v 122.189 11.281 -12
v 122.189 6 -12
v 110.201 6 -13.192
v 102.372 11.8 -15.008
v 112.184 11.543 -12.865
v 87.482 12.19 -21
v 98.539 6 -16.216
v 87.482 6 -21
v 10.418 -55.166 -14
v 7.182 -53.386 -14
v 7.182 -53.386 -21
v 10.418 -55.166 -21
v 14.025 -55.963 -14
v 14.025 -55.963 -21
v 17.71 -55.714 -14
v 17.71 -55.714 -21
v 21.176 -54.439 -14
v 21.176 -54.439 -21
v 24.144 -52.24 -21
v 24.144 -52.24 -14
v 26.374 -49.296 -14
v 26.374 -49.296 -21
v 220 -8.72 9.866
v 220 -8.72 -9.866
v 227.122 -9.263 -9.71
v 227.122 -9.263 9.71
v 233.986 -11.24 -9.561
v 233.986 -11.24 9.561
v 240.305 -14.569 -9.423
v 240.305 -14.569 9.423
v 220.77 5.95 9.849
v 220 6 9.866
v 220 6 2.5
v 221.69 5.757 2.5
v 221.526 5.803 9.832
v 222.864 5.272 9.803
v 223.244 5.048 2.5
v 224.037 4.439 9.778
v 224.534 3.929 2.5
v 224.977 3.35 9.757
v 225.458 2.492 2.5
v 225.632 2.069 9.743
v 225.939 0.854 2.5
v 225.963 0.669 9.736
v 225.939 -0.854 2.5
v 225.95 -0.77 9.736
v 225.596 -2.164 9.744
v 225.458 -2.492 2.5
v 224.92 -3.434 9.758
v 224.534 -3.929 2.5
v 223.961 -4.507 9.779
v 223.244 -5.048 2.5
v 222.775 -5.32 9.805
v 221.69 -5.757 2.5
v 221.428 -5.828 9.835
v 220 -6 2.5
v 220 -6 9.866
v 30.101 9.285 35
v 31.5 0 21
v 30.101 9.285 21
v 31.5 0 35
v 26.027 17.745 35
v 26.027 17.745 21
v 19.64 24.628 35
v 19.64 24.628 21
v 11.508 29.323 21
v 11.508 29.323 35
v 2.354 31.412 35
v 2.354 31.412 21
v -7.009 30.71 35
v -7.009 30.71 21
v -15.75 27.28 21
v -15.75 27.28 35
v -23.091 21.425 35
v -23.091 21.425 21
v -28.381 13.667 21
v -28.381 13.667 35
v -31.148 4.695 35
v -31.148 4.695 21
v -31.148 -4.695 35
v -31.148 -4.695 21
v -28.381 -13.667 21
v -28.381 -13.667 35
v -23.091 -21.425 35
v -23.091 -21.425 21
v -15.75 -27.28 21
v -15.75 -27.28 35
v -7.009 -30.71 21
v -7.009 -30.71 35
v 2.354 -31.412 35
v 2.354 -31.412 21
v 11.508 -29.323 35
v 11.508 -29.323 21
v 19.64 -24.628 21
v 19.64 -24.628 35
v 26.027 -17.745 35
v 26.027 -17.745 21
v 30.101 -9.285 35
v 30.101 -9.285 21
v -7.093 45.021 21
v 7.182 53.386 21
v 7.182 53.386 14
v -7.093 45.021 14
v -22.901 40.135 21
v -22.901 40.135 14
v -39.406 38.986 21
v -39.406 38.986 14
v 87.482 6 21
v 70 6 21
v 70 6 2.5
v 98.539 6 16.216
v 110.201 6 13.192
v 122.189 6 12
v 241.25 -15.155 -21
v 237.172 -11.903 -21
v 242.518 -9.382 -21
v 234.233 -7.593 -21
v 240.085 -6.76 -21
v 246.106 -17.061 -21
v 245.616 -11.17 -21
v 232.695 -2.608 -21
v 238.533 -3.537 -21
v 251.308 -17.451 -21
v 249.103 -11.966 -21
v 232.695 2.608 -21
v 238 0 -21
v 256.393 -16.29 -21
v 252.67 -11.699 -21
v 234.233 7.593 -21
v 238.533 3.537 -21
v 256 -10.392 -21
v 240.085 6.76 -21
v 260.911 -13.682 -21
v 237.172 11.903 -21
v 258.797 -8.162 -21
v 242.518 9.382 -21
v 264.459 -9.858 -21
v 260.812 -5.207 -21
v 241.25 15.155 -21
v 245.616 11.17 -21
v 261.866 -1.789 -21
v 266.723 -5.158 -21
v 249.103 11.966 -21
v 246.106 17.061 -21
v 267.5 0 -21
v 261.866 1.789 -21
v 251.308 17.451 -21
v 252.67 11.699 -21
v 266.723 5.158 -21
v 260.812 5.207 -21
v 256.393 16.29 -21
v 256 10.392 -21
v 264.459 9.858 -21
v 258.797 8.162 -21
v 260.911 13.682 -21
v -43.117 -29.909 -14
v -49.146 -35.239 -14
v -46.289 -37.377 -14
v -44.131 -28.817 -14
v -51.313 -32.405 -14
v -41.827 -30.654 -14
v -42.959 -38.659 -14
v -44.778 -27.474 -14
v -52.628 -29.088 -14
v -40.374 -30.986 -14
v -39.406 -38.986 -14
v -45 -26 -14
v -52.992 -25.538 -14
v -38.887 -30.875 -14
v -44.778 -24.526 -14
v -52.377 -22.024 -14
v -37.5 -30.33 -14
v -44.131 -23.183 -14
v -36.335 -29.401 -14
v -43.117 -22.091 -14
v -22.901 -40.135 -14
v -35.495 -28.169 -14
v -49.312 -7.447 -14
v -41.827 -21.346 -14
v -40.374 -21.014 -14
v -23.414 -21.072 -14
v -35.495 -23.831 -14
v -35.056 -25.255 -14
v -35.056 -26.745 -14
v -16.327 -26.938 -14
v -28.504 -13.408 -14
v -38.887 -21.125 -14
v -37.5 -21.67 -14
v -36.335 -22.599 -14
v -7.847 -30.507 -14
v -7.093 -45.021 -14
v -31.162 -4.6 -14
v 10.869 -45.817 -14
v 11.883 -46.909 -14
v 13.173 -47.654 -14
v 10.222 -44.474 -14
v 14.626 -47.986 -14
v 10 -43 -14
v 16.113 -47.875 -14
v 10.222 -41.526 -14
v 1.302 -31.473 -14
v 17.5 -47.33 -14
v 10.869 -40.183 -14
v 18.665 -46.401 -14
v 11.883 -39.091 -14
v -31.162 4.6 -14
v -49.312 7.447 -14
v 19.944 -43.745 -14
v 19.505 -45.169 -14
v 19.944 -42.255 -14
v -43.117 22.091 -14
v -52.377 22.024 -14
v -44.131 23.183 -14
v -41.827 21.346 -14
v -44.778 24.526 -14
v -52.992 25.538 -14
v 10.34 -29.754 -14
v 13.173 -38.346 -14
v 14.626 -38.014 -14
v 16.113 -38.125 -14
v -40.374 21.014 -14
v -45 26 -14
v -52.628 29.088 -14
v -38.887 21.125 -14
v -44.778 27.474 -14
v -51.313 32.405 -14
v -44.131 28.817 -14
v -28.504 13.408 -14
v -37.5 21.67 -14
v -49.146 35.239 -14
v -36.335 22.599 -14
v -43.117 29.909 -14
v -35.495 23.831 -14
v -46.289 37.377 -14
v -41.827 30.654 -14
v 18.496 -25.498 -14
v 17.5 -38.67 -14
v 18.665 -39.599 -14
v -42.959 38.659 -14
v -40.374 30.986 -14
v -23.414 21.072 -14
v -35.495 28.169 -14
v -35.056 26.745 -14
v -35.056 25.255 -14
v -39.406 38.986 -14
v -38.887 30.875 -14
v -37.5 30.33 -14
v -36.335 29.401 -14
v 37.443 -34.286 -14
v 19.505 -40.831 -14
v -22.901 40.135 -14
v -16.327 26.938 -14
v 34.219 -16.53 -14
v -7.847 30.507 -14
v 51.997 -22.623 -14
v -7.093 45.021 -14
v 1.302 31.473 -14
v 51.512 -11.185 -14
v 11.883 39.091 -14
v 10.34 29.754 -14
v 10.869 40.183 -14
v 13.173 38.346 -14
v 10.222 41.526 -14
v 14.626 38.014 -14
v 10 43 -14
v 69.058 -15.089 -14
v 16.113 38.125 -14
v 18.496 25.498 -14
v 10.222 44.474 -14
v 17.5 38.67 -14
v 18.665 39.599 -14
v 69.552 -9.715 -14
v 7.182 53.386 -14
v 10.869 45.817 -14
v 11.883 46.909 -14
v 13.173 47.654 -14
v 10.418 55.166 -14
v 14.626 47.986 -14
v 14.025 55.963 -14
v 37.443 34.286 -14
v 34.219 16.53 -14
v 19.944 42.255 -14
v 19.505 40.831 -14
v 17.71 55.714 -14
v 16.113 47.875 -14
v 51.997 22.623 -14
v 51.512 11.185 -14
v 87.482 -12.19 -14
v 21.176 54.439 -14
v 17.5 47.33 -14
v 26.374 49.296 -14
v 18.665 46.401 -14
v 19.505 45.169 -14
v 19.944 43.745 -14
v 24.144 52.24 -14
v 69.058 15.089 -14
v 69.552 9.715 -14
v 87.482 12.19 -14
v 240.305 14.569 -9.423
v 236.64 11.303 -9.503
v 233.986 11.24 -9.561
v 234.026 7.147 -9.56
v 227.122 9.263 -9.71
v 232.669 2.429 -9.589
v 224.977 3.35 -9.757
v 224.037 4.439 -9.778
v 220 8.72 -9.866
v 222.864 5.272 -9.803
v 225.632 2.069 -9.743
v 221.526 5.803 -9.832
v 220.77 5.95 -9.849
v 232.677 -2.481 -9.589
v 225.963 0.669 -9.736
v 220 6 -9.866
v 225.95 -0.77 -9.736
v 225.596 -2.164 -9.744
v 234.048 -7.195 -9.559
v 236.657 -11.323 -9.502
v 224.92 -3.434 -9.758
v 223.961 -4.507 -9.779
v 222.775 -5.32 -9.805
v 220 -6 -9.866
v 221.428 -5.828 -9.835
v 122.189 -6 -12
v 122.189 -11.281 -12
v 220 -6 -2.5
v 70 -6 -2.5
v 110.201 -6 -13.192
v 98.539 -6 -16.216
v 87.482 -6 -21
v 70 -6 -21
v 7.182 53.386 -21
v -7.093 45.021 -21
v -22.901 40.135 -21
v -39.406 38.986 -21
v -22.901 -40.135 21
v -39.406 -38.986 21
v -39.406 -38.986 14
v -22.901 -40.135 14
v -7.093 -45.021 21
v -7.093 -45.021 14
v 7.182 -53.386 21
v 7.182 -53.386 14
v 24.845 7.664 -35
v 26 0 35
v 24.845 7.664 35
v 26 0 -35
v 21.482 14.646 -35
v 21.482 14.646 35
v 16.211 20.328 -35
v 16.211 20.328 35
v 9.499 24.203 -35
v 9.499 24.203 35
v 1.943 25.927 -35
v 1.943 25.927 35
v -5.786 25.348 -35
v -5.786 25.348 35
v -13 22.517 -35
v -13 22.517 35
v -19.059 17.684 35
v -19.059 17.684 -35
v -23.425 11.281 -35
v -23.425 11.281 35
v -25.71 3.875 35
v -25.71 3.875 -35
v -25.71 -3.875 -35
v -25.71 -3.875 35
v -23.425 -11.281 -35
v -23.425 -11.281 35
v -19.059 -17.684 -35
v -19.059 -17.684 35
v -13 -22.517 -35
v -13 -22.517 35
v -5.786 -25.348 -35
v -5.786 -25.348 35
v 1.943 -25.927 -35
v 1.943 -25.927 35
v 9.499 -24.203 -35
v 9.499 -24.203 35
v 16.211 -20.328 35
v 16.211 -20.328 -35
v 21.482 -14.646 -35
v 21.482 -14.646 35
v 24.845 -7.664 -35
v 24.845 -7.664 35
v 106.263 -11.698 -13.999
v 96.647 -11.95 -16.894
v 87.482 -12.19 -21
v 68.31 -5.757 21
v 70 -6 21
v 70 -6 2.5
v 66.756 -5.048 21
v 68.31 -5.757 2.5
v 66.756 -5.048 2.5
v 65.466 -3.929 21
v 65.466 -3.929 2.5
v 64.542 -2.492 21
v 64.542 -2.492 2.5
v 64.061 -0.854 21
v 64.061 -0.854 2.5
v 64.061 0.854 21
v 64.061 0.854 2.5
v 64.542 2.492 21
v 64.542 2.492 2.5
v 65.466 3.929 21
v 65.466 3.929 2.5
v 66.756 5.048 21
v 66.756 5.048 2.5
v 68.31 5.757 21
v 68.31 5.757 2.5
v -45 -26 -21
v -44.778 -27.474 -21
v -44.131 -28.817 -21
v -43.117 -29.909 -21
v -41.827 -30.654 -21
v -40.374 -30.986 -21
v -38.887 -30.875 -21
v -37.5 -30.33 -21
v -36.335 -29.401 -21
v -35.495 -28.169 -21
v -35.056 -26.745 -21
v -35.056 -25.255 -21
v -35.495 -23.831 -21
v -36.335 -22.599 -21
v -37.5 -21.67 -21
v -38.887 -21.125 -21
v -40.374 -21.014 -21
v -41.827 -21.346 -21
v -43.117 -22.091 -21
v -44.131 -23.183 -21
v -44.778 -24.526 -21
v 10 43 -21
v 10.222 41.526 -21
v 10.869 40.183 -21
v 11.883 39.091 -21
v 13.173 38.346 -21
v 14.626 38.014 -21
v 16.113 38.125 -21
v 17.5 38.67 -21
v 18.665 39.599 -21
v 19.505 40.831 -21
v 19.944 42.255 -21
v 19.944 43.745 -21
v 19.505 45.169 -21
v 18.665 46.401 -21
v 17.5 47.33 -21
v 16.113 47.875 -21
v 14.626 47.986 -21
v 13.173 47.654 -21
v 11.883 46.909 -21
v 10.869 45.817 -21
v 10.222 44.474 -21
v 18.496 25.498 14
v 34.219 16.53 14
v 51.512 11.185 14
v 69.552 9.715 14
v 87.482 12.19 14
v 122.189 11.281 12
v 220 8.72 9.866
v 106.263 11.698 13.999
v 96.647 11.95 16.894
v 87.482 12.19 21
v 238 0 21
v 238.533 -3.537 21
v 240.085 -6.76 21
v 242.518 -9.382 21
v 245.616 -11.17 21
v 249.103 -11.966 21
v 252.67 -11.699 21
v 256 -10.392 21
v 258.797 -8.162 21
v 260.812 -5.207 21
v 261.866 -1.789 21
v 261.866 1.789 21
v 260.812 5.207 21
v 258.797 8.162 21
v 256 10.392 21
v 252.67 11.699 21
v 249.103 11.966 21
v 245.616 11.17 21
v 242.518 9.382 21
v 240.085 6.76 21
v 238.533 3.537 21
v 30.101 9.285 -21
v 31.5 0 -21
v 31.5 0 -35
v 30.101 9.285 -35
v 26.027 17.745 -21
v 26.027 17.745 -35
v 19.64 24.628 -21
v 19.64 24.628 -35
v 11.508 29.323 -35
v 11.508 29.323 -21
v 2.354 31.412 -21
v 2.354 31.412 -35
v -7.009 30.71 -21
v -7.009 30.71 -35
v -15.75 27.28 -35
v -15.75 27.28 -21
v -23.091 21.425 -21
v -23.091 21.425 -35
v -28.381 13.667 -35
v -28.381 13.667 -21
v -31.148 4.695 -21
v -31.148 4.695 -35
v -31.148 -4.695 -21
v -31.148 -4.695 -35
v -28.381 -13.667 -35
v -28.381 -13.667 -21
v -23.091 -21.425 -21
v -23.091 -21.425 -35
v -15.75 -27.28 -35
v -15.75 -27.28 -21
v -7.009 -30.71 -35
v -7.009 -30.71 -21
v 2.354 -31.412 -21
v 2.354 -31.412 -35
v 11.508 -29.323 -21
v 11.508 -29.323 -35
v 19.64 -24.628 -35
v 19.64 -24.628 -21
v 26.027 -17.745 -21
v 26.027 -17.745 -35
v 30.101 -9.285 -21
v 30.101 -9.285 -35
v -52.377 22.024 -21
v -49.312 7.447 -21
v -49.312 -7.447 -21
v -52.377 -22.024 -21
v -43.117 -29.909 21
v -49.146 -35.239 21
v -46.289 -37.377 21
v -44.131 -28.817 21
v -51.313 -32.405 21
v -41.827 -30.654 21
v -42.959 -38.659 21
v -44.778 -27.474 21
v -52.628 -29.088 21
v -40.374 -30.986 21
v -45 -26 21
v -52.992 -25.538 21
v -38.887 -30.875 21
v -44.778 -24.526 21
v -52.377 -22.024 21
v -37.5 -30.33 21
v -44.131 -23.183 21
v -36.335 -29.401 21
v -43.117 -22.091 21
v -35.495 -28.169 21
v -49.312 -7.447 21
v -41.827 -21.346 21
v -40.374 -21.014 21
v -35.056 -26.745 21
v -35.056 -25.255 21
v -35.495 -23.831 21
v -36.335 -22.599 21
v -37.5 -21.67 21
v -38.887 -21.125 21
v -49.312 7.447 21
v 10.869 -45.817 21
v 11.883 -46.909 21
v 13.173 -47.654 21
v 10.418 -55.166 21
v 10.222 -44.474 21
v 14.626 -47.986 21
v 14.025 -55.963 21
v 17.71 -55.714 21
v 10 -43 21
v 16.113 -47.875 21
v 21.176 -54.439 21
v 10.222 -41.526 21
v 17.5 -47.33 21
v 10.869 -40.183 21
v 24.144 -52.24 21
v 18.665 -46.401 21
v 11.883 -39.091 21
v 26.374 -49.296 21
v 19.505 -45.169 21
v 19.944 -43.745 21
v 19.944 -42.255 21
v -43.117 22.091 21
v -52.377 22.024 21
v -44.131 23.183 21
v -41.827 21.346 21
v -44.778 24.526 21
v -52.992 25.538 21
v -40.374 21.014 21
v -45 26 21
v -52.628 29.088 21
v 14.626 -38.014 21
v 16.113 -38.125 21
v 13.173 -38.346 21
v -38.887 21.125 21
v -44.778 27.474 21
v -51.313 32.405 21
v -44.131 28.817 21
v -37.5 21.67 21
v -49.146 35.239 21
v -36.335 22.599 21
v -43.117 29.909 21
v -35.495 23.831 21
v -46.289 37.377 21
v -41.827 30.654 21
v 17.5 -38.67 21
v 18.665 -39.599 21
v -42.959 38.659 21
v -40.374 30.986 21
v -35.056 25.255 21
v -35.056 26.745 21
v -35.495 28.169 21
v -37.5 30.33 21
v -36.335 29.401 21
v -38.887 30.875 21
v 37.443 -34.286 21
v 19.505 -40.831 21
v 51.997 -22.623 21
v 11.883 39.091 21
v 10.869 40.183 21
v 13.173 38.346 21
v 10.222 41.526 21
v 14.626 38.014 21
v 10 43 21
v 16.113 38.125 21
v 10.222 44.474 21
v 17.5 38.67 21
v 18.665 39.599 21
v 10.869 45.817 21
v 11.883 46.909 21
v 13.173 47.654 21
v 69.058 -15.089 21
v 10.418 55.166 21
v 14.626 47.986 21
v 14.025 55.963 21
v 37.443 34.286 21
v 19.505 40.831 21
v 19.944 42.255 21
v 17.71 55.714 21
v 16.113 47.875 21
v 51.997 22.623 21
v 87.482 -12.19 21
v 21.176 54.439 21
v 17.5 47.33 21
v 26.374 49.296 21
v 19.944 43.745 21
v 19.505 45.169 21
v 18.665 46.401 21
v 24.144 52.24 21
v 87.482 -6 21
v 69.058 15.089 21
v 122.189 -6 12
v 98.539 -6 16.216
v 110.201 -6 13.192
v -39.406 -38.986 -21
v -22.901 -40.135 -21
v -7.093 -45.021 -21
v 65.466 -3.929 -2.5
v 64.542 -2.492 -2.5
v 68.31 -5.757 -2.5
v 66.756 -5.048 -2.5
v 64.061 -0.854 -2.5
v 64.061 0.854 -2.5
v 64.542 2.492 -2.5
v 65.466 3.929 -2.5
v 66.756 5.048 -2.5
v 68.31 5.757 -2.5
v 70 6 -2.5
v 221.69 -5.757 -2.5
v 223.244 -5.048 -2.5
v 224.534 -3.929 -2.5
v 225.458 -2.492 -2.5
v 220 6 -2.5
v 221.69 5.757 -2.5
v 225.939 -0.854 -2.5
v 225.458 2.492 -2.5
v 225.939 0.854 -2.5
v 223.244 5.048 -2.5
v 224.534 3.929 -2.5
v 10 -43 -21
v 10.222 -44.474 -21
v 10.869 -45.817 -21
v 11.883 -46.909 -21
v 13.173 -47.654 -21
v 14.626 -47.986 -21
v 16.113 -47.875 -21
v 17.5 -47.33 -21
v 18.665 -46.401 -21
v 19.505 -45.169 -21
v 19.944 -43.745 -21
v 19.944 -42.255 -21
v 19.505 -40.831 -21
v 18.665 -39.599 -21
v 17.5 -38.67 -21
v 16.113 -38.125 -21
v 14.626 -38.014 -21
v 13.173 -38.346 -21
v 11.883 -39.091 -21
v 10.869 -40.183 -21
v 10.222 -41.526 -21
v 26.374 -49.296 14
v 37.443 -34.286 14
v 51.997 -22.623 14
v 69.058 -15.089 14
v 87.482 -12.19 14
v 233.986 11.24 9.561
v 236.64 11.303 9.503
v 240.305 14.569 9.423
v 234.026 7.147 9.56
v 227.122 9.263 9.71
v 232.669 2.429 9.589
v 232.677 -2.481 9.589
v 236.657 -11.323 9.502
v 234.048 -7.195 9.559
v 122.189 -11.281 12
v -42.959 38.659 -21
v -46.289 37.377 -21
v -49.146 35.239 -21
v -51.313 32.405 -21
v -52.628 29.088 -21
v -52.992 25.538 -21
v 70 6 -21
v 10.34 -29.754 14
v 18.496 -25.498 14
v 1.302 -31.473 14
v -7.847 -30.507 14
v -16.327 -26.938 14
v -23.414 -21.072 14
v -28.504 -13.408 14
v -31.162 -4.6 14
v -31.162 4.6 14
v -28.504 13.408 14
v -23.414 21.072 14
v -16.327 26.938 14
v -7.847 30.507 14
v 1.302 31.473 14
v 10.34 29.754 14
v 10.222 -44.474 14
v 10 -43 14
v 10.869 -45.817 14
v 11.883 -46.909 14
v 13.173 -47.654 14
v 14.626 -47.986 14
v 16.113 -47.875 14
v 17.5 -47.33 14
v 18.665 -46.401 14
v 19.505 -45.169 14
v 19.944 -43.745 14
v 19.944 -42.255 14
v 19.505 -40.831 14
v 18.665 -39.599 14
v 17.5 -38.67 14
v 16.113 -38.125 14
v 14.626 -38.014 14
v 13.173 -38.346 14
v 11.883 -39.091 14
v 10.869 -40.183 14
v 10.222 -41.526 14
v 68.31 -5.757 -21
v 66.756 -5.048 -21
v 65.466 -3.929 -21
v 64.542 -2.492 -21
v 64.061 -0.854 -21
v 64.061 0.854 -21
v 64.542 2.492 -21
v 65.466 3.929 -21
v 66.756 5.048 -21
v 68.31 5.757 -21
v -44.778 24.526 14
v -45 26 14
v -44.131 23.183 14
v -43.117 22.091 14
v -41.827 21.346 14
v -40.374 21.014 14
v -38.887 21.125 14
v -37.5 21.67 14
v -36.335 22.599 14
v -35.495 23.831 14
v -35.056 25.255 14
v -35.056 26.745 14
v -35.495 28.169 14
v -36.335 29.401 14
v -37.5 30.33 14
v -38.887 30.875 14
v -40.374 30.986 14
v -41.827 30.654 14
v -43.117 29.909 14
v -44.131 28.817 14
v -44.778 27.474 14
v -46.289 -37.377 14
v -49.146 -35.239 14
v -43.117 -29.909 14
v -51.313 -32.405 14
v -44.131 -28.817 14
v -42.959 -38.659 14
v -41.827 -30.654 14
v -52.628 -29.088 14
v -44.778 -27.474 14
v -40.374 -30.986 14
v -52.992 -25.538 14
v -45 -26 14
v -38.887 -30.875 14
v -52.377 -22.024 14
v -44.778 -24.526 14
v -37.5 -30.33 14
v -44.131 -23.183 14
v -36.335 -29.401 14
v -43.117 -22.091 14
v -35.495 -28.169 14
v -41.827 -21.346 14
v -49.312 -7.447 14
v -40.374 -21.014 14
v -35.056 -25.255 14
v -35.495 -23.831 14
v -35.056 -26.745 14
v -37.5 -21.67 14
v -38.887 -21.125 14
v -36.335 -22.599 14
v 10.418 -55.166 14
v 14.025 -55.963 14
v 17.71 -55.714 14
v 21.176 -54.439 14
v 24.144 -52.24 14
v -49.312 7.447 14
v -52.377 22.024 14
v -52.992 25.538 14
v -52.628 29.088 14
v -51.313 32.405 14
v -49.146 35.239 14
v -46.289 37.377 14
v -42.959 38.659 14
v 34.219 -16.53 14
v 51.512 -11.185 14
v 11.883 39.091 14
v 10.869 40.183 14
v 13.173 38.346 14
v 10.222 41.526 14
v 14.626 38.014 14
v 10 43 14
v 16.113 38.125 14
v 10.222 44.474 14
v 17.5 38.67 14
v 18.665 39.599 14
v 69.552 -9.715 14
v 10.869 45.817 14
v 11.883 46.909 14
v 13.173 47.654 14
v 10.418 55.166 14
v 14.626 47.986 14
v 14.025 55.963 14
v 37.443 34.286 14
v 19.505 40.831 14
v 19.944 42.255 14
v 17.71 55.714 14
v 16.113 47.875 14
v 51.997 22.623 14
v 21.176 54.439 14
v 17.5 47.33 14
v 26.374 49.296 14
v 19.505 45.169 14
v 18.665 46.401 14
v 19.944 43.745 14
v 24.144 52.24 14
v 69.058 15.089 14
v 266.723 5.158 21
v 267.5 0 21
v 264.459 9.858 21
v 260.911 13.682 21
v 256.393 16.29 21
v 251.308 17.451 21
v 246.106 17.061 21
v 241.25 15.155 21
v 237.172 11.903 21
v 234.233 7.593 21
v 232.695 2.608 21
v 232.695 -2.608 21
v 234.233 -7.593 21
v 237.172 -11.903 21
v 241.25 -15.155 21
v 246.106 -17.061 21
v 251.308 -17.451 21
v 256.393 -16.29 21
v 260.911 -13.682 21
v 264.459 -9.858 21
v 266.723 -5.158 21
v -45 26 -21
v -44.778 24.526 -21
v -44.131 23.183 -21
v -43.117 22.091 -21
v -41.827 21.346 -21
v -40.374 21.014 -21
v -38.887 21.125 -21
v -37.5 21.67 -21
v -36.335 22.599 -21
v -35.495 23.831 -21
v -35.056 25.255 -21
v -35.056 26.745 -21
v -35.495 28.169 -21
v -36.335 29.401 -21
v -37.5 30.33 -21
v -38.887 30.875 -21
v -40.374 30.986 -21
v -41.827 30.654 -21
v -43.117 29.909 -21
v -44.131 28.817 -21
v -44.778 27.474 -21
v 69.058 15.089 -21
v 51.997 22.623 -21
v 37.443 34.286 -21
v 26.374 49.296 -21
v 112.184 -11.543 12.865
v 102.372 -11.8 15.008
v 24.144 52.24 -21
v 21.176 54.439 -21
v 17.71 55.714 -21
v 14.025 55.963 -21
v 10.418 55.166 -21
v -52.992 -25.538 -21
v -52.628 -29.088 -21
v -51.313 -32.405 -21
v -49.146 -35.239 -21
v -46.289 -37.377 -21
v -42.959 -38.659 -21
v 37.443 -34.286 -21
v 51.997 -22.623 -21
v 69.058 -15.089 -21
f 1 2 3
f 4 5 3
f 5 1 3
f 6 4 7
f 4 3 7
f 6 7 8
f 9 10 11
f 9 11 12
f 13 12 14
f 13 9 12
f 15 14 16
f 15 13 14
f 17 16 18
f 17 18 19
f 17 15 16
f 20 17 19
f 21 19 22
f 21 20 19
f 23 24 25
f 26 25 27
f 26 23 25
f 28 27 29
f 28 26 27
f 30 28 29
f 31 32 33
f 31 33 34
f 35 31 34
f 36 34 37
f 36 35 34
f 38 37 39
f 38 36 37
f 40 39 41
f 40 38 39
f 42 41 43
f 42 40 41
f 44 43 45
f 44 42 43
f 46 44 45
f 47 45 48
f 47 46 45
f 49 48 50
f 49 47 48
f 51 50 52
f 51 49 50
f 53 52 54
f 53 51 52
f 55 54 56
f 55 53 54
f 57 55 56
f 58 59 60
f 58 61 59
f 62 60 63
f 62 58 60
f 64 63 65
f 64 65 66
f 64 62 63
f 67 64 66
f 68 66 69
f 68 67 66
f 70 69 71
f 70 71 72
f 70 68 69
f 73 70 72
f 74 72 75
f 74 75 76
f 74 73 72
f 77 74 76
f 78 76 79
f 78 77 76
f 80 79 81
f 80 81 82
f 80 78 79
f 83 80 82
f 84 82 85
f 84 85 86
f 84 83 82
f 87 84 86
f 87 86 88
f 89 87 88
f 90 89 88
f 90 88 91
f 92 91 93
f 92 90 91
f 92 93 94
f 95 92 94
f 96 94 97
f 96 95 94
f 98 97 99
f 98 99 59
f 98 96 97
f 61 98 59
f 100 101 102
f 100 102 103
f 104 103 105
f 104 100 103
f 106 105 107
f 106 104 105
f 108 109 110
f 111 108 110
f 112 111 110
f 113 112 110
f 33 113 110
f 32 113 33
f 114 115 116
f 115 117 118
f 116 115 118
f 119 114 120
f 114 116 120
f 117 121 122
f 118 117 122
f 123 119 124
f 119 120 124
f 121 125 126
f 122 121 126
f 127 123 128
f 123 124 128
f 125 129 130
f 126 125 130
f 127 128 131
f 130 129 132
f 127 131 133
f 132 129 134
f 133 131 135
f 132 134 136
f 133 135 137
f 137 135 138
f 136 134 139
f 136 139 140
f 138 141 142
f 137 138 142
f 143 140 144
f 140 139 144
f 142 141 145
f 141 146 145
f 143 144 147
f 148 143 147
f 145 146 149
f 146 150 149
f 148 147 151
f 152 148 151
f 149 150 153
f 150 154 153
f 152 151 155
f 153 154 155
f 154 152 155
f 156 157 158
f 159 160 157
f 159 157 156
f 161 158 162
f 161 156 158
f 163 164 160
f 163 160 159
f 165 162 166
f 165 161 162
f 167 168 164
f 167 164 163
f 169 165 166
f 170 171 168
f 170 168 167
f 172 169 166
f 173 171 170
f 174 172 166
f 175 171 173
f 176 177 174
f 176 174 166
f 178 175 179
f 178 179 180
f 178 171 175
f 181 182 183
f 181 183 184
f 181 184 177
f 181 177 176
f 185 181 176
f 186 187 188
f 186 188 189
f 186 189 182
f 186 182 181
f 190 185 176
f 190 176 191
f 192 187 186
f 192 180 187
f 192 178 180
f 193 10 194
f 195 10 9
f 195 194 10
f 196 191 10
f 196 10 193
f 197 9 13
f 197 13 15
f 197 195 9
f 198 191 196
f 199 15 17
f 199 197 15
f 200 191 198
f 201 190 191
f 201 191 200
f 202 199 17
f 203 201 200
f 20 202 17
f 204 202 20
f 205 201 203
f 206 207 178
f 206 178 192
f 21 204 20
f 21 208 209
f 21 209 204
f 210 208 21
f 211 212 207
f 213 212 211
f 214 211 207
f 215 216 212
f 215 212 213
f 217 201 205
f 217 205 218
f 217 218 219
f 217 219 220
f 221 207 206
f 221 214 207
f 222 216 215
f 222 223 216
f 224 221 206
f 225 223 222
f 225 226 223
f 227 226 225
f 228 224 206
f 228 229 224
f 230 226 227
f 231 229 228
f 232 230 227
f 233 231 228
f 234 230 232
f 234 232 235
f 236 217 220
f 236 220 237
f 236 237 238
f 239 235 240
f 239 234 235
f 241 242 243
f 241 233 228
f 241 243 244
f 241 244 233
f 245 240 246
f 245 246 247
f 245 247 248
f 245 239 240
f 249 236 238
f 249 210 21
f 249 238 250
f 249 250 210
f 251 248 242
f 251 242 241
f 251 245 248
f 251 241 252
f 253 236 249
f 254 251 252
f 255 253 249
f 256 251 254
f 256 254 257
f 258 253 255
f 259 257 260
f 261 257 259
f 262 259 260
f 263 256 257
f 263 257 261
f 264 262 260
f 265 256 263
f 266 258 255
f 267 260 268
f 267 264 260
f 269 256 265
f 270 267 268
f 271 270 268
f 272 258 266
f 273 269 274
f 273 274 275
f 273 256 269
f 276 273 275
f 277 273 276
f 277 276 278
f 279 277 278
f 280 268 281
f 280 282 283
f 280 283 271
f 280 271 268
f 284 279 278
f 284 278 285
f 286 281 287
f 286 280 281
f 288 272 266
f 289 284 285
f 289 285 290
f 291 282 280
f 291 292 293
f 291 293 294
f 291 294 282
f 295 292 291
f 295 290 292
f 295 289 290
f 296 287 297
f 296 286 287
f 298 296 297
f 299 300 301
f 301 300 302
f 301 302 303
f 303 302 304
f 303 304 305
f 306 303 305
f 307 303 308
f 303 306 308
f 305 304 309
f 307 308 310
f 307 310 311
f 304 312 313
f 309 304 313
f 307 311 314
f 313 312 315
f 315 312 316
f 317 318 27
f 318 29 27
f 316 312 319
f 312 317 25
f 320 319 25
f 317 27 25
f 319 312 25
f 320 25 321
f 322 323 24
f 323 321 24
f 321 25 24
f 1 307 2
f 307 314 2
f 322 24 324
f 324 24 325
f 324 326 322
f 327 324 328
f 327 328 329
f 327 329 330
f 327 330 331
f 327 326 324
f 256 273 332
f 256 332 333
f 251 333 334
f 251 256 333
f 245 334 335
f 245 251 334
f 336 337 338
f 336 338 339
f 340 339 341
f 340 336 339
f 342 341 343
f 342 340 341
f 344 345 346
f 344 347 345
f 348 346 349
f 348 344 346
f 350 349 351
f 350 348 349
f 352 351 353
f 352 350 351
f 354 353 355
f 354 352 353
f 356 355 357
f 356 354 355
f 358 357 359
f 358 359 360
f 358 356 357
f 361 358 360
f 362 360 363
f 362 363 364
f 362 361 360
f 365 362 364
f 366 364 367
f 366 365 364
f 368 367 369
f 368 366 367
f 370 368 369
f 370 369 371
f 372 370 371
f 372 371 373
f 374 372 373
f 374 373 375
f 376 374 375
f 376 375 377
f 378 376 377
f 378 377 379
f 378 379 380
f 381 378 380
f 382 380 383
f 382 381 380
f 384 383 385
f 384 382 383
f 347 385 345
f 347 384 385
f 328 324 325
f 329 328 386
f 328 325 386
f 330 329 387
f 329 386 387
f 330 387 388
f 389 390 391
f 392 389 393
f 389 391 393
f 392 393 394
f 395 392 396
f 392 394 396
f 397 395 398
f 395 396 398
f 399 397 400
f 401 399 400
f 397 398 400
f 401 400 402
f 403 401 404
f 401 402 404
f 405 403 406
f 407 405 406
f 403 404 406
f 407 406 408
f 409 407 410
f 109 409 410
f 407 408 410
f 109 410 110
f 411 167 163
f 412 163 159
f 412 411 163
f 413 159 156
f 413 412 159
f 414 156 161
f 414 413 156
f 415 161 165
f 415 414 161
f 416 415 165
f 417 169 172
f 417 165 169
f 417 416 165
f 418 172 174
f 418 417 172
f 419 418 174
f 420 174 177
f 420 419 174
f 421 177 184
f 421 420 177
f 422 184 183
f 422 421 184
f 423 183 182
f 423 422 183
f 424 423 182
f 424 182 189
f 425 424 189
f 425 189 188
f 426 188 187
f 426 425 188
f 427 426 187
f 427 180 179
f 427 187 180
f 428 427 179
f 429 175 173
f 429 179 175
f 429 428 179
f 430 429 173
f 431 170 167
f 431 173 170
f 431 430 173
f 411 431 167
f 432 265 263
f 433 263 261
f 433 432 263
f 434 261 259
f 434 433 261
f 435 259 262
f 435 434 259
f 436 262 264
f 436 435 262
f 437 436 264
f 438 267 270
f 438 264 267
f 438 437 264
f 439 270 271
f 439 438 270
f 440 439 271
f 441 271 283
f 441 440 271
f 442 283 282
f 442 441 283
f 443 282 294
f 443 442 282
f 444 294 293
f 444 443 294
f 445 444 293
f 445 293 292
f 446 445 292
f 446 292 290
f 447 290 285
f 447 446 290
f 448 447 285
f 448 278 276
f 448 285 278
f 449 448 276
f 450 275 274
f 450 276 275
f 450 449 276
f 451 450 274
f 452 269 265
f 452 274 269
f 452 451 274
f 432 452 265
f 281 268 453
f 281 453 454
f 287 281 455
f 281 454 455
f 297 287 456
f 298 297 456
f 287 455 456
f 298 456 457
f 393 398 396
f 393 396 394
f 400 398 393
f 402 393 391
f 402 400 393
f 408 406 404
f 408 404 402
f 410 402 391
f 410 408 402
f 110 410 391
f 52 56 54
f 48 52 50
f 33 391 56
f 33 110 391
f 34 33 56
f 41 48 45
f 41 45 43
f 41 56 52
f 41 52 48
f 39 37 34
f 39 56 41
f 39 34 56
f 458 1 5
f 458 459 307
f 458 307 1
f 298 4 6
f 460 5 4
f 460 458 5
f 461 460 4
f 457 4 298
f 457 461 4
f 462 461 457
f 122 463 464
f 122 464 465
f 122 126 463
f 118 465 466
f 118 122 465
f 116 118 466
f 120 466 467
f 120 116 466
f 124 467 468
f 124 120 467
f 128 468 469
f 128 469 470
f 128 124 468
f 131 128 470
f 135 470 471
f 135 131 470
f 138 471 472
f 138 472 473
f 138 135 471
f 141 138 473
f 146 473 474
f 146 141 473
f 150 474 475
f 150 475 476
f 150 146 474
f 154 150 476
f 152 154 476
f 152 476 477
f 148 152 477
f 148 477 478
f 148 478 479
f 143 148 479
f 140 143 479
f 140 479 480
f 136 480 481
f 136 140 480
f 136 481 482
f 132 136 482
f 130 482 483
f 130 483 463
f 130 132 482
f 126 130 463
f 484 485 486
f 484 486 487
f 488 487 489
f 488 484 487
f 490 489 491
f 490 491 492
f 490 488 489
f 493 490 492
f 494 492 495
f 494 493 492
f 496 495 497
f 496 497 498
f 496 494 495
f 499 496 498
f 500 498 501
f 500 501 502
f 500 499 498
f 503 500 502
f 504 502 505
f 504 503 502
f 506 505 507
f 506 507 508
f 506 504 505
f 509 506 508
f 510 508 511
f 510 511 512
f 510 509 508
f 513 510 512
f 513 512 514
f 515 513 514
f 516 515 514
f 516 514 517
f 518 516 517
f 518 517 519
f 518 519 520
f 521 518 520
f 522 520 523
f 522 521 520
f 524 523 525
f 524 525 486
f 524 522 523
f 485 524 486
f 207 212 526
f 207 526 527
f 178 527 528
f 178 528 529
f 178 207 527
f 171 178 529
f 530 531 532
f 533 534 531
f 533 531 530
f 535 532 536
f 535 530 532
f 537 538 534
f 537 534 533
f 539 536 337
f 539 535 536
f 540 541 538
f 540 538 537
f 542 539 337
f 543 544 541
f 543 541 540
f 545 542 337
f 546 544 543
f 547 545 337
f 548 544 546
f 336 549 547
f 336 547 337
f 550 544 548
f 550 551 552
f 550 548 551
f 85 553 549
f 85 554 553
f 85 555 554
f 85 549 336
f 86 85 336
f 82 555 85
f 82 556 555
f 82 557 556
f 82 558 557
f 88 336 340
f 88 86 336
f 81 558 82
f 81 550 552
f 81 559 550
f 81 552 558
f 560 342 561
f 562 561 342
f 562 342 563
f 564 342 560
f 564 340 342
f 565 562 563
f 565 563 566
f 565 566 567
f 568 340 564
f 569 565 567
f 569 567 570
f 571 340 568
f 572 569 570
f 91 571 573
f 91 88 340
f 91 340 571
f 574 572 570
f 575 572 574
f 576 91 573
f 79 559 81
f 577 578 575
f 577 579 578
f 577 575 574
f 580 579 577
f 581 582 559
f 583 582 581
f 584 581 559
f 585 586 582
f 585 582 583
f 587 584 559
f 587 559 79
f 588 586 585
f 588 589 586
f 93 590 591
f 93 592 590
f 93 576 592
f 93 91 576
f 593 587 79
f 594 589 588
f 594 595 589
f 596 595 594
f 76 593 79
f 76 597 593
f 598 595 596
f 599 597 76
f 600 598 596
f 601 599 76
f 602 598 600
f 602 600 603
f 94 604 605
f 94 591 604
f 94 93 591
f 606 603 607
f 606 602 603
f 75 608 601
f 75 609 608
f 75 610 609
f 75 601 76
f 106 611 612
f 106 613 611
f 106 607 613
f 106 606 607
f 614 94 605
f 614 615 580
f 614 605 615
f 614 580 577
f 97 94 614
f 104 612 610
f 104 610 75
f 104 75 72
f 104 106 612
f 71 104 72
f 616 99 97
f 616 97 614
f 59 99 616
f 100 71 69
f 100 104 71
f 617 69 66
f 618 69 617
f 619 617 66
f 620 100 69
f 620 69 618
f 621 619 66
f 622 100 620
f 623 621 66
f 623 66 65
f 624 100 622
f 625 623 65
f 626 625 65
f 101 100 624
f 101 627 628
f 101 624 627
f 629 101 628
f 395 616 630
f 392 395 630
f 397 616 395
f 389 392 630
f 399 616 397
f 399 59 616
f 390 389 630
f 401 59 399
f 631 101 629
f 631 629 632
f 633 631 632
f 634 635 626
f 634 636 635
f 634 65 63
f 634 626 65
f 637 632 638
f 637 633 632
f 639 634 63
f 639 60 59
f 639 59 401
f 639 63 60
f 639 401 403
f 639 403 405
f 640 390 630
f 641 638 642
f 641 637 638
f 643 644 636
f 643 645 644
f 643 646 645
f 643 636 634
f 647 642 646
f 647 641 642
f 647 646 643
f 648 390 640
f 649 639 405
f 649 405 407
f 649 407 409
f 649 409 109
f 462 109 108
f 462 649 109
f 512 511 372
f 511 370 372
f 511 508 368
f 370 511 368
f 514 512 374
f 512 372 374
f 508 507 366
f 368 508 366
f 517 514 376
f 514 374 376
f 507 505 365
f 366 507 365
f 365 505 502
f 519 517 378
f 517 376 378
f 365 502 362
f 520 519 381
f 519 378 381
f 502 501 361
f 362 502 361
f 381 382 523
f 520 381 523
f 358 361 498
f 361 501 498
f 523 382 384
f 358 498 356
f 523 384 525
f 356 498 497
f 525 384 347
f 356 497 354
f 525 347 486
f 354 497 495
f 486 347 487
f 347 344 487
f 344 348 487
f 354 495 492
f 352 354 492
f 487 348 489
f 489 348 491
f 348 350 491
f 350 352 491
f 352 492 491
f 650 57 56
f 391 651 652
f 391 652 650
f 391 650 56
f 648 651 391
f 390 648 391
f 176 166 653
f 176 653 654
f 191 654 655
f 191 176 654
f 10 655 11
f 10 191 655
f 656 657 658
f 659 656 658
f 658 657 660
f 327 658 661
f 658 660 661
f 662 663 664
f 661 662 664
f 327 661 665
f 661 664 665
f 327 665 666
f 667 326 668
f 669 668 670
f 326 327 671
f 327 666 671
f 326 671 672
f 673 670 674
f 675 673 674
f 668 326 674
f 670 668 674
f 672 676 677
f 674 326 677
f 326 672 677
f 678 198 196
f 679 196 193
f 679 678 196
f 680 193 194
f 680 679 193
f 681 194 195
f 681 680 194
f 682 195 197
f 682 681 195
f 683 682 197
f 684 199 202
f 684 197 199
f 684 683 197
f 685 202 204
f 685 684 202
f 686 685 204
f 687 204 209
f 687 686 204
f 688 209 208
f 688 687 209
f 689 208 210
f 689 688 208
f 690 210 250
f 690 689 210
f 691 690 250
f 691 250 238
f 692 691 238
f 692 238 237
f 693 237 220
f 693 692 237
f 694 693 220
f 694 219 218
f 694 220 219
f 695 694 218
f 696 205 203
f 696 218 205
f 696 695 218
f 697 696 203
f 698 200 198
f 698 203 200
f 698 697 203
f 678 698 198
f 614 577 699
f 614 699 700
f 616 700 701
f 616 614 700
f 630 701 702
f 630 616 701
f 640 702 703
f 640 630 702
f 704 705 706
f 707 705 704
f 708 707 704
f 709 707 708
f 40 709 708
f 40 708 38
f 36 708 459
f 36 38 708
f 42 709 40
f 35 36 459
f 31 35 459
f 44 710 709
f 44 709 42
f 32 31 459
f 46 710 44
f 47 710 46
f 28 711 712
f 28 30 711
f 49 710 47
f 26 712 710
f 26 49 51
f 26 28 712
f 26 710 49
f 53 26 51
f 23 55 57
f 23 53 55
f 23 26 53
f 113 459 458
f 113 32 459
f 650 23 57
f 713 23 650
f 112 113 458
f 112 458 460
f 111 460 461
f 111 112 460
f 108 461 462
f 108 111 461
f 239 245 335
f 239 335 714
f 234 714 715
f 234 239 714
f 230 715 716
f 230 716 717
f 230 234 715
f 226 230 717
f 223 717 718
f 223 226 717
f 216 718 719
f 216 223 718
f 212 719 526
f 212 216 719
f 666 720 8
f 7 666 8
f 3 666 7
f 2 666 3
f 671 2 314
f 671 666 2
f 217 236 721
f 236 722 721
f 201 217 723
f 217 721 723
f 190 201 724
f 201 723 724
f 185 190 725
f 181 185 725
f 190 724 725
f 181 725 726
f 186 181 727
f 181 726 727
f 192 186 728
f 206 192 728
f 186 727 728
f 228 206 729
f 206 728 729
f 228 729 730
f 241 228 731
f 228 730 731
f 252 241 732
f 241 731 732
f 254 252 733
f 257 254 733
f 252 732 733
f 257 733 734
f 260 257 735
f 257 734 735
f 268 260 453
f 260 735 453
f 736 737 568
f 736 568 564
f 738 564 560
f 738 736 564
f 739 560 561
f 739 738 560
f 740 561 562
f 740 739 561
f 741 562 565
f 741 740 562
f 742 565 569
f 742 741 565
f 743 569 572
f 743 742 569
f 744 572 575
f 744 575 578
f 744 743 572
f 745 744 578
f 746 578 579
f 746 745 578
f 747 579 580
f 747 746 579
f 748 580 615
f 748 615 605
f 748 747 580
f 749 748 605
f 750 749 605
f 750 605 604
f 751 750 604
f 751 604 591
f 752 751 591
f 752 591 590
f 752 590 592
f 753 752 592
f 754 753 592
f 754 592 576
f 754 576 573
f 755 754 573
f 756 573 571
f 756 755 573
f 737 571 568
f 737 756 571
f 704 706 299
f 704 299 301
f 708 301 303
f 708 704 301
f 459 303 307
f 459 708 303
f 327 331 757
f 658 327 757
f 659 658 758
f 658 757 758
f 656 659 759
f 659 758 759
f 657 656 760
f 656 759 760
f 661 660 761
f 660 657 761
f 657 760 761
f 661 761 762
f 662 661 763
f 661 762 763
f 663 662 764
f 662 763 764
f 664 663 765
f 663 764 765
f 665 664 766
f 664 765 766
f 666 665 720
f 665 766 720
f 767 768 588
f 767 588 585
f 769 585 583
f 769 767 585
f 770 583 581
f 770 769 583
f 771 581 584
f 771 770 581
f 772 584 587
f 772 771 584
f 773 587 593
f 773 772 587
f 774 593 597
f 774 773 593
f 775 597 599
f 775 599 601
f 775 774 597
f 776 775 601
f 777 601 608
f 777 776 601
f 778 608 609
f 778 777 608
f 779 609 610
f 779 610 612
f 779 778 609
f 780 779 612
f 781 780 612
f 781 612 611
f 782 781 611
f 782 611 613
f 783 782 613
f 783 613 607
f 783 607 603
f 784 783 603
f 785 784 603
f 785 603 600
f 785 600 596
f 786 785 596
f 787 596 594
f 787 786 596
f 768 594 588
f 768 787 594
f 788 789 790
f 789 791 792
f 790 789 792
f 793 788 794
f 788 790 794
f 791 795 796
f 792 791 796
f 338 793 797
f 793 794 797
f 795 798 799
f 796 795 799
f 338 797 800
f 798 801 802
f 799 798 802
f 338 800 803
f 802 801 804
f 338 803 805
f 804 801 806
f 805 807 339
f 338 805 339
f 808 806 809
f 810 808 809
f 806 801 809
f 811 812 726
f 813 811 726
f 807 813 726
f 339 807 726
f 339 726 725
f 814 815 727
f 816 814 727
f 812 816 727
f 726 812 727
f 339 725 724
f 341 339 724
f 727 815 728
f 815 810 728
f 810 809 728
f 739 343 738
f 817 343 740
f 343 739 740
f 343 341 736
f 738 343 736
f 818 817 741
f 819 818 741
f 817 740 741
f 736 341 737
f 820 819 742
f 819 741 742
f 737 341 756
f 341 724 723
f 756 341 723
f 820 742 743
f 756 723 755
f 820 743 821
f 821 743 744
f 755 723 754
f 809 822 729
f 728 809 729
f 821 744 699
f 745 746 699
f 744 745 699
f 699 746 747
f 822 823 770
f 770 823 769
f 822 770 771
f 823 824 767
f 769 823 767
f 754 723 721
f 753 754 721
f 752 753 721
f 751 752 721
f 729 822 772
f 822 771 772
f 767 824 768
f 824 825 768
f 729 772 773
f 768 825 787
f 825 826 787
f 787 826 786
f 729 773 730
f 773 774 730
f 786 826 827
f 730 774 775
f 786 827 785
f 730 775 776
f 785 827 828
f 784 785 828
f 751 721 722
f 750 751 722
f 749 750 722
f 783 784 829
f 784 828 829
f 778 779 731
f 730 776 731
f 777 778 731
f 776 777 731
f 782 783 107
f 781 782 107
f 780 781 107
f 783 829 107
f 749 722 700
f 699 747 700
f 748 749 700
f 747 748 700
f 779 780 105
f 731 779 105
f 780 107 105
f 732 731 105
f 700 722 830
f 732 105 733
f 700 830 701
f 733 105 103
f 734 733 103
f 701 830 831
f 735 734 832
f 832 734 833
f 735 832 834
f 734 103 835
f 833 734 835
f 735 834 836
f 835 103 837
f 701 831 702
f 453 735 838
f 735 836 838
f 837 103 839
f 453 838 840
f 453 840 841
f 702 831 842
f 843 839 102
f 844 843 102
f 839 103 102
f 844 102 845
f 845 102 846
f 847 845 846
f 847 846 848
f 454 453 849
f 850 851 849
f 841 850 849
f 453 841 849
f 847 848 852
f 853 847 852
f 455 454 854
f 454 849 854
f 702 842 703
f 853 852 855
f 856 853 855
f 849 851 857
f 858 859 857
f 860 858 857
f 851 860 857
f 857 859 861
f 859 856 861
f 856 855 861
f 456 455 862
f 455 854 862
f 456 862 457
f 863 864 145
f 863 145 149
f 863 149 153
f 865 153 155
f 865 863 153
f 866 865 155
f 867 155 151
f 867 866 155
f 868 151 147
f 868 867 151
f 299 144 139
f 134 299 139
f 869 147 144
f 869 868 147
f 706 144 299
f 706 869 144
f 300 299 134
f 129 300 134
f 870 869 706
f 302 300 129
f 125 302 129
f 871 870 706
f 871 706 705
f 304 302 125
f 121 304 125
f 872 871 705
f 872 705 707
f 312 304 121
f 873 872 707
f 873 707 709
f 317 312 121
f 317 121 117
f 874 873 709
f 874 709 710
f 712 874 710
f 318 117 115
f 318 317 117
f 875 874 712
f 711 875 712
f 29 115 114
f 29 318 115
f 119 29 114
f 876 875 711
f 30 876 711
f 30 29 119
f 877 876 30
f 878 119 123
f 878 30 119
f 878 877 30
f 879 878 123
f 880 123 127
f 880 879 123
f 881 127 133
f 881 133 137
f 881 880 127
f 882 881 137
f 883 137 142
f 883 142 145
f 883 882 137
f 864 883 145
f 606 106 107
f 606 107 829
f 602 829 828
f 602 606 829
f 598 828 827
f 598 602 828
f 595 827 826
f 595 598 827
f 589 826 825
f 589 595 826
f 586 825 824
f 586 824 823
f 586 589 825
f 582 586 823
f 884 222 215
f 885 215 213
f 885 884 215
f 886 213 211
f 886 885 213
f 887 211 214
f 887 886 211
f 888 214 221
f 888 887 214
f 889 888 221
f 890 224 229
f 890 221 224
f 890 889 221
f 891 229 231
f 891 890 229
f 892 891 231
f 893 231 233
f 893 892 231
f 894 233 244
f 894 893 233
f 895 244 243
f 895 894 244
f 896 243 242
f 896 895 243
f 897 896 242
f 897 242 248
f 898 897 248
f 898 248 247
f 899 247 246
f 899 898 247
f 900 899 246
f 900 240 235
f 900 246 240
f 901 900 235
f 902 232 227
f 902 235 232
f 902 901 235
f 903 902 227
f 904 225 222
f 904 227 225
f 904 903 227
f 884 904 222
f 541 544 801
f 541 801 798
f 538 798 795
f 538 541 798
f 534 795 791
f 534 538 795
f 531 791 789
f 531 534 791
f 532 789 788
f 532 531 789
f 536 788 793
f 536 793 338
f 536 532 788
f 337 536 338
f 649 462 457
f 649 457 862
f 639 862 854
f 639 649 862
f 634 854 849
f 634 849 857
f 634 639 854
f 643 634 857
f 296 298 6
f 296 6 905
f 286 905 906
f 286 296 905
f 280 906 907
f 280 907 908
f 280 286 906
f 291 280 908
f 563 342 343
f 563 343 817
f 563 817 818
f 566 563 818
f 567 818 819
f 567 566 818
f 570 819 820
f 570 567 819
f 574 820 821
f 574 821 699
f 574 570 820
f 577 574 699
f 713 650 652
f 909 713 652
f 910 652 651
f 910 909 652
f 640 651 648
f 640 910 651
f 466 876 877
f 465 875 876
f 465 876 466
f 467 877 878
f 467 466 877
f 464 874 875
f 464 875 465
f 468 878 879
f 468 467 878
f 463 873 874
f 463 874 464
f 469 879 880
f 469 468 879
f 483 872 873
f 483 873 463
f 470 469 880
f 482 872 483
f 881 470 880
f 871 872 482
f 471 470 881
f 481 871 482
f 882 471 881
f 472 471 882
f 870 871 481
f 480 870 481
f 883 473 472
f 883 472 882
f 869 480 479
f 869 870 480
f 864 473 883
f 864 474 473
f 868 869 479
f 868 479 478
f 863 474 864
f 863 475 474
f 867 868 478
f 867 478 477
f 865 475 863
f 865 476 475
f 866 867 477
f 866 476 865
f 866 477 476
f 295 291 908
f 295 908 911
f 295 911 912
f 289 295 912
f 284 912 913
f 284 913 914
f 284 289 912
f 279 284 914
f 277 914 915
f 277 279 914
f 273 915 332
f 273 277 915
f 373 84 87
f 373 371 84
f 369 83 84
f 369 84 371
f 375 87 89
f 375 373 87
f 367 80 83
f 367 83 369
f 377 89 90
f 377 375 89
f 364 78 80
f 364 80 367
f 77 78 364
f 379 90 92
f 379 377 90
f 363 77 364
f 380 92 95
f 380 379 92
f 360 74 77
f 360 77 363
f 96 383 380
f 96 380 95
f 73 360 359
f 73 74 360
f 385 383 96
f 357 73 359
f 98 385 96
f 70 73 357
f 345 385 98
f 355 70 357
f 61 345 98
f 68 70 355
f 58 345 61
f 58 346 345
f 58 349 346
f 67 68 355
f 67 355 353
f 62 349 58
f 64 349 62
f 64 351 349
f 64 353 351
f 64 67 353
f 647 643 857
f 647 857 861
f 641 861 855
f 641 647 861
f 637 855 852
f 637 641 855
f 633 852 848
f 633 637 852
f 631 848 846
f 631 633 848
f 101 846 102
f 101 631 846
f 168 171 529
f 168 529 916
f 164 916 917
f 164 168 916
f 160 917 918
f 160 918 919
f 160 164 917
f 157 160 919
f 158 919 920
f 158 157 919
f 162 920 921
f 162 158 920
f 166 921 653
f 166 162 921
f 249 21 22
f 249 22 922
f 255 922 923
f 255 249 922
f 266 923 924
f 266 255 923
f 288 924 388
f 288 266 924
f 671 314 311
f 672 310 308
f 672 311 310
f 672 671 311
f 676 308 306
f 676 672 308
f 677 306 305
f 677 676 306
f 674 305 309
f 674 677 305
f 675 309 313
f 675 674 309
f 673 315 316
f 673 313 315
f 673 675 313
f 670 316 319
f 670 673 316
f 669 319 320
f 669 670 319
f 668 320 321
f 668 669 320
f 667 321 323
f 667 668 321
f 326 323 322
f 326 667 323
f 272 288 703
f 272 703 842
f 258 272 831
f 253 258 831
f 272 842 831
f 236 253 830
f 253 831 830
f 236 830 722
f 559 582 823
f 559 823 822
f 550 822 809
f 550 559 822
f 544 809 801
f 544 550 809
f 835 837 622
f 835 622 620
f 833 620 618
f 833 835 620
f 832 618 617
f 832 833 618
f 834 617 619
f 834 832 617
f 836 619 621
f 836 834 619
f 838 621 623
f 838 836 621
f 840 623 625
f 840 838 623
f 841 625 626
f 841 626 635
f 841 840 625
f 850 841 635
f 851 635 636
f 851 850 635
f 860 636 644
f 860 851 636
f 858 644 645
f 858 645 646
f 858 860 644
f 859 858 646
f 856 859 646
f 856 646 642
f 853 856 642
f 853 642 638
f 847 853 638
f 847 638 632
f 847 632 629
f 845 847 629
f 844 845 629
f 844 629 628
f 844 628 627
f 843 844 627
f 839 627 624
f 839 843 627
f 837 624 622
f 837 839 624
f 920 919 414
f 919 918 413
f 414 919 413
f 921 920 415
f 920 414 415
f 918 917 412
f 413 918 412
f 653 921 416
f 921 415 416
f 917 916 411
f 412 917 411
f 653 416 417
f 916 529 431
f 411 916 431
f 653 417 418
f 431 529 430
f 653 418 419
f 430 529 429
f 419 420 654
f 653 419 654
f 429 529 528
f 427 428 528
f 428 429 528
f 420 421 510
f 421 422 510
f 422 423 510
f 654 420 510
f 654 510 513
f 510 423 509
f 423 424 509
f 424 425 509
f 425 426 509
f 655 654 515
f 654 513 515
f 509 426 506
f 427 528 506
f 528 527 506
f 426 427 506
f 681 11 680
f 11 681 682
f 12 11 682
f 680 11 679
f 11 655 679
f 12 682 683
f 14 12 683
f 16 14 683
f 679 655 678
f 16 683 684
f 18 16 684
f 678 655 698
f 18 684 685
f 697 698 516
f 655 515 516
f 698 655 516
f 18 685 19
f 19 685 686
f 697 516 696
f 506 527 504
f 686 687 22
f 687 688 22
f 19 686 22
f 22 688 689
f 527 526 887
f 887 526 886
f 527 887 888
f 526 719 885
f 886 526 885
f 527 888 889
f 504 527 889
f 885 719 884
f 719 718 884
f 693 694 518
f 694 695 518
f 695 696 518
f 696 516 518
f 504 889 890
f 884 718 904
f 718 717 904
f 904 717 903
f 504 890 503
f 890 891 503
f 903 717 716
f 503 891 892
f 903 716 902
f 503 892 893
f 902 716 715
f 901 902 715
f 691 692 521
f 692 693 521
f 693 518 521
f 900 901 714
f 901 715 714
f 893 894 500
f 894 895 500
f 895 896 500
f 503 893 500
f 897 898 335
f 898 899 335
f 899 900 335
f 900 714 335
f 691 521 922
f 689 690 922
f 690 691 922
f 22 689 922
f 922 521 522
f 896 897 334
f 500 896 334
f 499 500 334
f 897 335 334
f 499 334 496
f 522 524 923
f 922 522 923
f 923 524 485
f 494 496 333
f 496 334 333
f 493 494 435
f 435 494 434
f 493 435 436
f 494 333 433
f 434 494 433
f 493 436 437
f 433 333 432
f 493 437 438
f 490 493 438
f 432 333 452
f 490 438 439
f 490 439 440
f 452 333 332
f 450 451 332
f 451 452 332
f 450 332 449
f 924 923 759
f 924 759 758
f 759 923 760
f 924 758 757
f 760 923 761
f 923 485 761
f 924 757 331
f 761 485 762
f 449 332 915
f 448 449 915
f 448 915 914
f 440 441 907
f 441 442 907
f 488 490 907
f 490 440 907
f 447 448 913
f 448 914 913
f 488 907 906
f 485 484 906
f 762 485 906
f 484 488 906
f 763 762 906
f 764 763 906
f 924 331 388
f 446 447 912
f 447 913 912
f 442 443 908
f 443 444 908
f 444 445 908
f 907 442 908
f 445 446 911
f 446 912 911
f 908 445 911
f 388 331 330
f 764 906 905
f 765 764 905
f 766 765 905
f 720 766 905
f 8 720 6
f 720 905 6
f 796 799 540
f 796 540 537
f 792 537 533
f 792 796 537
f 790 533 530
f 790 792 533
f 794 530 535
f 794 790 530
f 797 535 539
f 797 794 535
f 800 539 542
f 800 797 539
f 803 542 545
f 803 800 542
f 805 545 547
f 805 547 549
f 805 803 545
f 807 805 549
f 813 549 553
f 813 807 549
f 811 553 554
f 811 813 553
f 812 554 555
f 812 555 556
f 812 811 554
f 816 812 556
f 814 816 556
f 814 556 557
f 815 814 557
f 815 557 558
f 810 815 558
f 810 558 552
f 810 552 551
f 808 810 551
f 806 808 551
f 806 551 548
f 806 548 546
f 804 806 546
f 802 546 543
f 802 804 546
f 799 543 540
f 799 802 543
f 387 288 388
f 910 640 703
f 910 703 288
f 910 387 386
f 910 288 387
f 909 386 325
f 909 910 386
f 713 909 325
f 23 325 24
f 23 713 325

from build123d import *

# Parameters (mm, degrees)
SKETCH1_R               = 31.5
SKETCH1_R_2             = 26
BOSS_EXTRUDE1_DEPTH     = 35
SKETCH1_3_R             = 5
SKETCH1_3_R_2           = 31.5
BOSS_EXTRUDE2_DEPTH     = 21
BOSS_EXTRUDE3_DEPTH     = 2.5
CUT_EXTRUDE1_DEPTH      = 250.214133183
CUT_EXTRUDE1_DEPTH_BACK = 250.214133183
SKETCH1_5_R             = 17.5
SKETCH1_5_R_2           = 12
BOSS_EXTRUDE4_DEPTH     = 21
CUT_EXTRUDE2_DEPTH      = 14


with BuildPart() as part:
    # Sketch1 → Boss-Extrude1 (new, symmetric)
    with BuildSketch(Plane.XY):
        Circle(SKETCH1_R)
        Circle(SKETCH1_R_2, mode=Mode.SUBTRACT)
    extrude(amount=BOSS_EXTRUDE1_DEPTH, both=True)

    # Sketch1_3 → Boss-Extrude2 (add, symmetric)
    with BuildSketch(Plane.XY):
        with BuildLine():
            Line((220, 8.719912605), (87.482015231, 12.190018161))
            ThreePointArc((87.482015231, 12.190018161), (51.997088566, 22.622612499), (26.373739078, 49.29587638))
            ThreePointArc((26.373739078, 49.29587638), (17.709961948, 55.714405462), (7.181946677, 53.386435492))
            ThreePointArc((7.181946677, 53.386435492), (-14.855989459, 42.122318837), (-39.406288617, 38.986435492))
            ThreePointArc((-39.406288617, 38.986435492), (-50.326951915, 33.896458963), (-52.376901133, 22.023529412))
            ThreePointArc((-52.376901133, 22.023529412), (-48.925892025, 0), (-52.376901133, -22.023529412))
            ThreePointArc((-52.376901133, -22.023529412), (-50.326951915, -33.896458963), (-39.406288617, -38.986435492))
            ThreePointArc((-39.406288617, -38.986435492), (-14.855989459, -42.122318837), (7.181946677, -53.386435492))
            ThreePointArc((7.181946677, -53.386435492), (17.709961948, -55.714405462), (26.373739078, -49.29587638))
            ThreePointArc((26.373739078, -49.29587638), (51.997088566, -22.622612499), (87.482015231, -12.190018161))
            Line((87.482015231, -12.190018161), (220, -8.719912605))
            ThreePointArc((220, -8.719912605), (230.604685788, -10.075596562), (240.30539773, -14.569306326))
            ThreePointArc((240.30539773, -14.569306326), (232.5, 0), (240.30539773, 14.569306326))
            ThreePointArc((240.30539773, 14.569306326), (230.604685788, 10.075596562), (220, 8.719912605))
        make_face()
        with Locations(Location((15, -43, 0), (0, 0, 180))):
            Circle(SKETCH1_3_R, mode=Mode.SUBTRACT)
        with Locations(Location((-40, -26, 0), (0, 0, 180))):
            Circle(SKETCH1_3_R, mode=Mode.SUBTRACT)
        Circle(SKETCH1_3_R_2, mode=Mode.SUBTRACT)
        with Locations(Location((-40, 26, 0), (0, 0, 180))):
            Circle(SKETCH1_3_R, mode=Mode.SUBTRACT)
        with Locations(Location((15, 43, 0), (0, 0, 180))):
            Circle(SKETCH1_3_R, mode=Mode.SUBTRACT)
        with BuildLine():
            ThreePointArc((70, -6), (64, 0), (70, 6))
            Line((70, 6), (220, 6))
            ThreePointArc((220, 6), (226, 0), (220, -6))
            Line((220, -6), (70, -6))
        make_face(mode=Mode.SUBTRACT)
    extrude(amount=BOSS_EXTRUDE2_DEPTH, both=True)

    # Sketch1_4 → Boss-Extrude3 (add, symmetric)
    with BuildSketch(Plane.XY):
        with BuildLine():
            Line((70, -6), (220, -6))
            ThreePointArc((220, -6), (226, 0), (220, 6))
            Line((220, 6), (70, 6))
            ThreePointArc((70, 6), (64, 0), (70, -6))
        make_face()
    extrude(amount=BOSS_EXTRUDE3_DEPTH, both=True)

    # Sketch2 → Cut-Extrude1 (cut, two sides: drawn at the far end of the back side and taken through both)
    with BuildSketch(Plane(origin=(0, 0, 0), x_dir=(1, 0, 0), z_dir=(0, 1, 0)).offset(-CUT_EXTRUDE1_DEPTH_BACK)):
        with BuildLine():
            Line((240.30539773, -9.422684737), (122.188711449, -12))
            ThreePointArc((122.188711449, -12), (104.311213199, -14.478720031), (87.482015231, -21))
            Line((87.482015231, -21), (240.30539773, -21))
            Line((240.30539773, -21), (240.30539773, -9.422684737))
        make_face()
        with BuildLine():
            Line((240.30539773, 9.422684737), (122.188711449, 12))
            ThreePointArc((122.188711449, 12), (104.311213199, 14.478720031), (87.482015231, 21))
            Line((87.482015231, 21), (240.30539773, 21))
            Line((240.30539773, 21), (240.30539773, 9.422684737))
        make_face()
    extrude(amount=CUT_EXTRUDE1_DEPTH + CUT_EXTRUDE1_DEPTH_BACK, mode=Mode.SUBTRACT)

    # Sketch1_5 → Boss-Extrude4 (add, symmetric)
    with BuildSketch(Plane.XY):
        with Locations((250, 0)):
            Circle(SKETCH1_5_R)
        with Locations(Location((250, 0, 0), (0, 0, 180))):
            Circle(SKETCH1_5_R_2, mode=Mode.SUBTRACT)
    extrude(amount=BOSS_EXTRUDE4_DEPTH, both=True)

    # Sketch3 → Cut-Extrude2 (cut, symmetric)
    with BuildSketch(Plane.XY):
        with BuildLine():
            ThreePointArc((18.496414213, 25.497699136), (51.511708097, 11.184621648), (87.482015231, 12.190018161))
            ThreePointArc((87.482015231, 12.190018161), (51.997088566, 22.622612499), (26.373739078, 49.29587638))
            ThreePointArc((26.373739078, 49.29587638), (17.709961948, 55.714405462), (7.181946677, 53.386435492))
            ThreePointArc((7.181946677, 53.386435492), (-14.855989459, 42.122318837), (-39.406288617, 38.986435492))
            ThreePointArc((-39.406288617, 38.986435492), (-50.326951915, 33.896458963), (-52.376901133, 22.023529412))
            ThreePointArc((-52.376901133, 22.023529412), (-48.925892025, 0), (-52.376901133, -22.023529412))
            ThreePointArc((-52.376901133, -22.023529412), (-50.326951915, -33.896458963), (-39.406288617, -38.986435492))
            ThreePointArc((-39.406288617, -38.986435492), (-14.855989459, -42.122318837), (7.181946677, -53.386435492))
            ThreePointArc((7.181946677, -53.386435492), (17.709961948, -55.714405462), (26.373739078, -49.29587638))
            ThreePointArc((26.373739078, -49.29587638), (51.997088566, -22.622612499), (87.482015231, -12.190018161))
            ThreePointArc((87.482015231, -12.190018161), (51.511708097, -11.184621648), (18.496414213, -25.497699136))
            ThreePointArc((18.496414213, -25.497699136), (-31.5, 0), (18.496414213, 25.497699136))
        make_face()
    extrude(amount=CUT_EXTRUDE2_DEPTH, both=True, mode=Mode.SUBTRACT)


solid = part.part
